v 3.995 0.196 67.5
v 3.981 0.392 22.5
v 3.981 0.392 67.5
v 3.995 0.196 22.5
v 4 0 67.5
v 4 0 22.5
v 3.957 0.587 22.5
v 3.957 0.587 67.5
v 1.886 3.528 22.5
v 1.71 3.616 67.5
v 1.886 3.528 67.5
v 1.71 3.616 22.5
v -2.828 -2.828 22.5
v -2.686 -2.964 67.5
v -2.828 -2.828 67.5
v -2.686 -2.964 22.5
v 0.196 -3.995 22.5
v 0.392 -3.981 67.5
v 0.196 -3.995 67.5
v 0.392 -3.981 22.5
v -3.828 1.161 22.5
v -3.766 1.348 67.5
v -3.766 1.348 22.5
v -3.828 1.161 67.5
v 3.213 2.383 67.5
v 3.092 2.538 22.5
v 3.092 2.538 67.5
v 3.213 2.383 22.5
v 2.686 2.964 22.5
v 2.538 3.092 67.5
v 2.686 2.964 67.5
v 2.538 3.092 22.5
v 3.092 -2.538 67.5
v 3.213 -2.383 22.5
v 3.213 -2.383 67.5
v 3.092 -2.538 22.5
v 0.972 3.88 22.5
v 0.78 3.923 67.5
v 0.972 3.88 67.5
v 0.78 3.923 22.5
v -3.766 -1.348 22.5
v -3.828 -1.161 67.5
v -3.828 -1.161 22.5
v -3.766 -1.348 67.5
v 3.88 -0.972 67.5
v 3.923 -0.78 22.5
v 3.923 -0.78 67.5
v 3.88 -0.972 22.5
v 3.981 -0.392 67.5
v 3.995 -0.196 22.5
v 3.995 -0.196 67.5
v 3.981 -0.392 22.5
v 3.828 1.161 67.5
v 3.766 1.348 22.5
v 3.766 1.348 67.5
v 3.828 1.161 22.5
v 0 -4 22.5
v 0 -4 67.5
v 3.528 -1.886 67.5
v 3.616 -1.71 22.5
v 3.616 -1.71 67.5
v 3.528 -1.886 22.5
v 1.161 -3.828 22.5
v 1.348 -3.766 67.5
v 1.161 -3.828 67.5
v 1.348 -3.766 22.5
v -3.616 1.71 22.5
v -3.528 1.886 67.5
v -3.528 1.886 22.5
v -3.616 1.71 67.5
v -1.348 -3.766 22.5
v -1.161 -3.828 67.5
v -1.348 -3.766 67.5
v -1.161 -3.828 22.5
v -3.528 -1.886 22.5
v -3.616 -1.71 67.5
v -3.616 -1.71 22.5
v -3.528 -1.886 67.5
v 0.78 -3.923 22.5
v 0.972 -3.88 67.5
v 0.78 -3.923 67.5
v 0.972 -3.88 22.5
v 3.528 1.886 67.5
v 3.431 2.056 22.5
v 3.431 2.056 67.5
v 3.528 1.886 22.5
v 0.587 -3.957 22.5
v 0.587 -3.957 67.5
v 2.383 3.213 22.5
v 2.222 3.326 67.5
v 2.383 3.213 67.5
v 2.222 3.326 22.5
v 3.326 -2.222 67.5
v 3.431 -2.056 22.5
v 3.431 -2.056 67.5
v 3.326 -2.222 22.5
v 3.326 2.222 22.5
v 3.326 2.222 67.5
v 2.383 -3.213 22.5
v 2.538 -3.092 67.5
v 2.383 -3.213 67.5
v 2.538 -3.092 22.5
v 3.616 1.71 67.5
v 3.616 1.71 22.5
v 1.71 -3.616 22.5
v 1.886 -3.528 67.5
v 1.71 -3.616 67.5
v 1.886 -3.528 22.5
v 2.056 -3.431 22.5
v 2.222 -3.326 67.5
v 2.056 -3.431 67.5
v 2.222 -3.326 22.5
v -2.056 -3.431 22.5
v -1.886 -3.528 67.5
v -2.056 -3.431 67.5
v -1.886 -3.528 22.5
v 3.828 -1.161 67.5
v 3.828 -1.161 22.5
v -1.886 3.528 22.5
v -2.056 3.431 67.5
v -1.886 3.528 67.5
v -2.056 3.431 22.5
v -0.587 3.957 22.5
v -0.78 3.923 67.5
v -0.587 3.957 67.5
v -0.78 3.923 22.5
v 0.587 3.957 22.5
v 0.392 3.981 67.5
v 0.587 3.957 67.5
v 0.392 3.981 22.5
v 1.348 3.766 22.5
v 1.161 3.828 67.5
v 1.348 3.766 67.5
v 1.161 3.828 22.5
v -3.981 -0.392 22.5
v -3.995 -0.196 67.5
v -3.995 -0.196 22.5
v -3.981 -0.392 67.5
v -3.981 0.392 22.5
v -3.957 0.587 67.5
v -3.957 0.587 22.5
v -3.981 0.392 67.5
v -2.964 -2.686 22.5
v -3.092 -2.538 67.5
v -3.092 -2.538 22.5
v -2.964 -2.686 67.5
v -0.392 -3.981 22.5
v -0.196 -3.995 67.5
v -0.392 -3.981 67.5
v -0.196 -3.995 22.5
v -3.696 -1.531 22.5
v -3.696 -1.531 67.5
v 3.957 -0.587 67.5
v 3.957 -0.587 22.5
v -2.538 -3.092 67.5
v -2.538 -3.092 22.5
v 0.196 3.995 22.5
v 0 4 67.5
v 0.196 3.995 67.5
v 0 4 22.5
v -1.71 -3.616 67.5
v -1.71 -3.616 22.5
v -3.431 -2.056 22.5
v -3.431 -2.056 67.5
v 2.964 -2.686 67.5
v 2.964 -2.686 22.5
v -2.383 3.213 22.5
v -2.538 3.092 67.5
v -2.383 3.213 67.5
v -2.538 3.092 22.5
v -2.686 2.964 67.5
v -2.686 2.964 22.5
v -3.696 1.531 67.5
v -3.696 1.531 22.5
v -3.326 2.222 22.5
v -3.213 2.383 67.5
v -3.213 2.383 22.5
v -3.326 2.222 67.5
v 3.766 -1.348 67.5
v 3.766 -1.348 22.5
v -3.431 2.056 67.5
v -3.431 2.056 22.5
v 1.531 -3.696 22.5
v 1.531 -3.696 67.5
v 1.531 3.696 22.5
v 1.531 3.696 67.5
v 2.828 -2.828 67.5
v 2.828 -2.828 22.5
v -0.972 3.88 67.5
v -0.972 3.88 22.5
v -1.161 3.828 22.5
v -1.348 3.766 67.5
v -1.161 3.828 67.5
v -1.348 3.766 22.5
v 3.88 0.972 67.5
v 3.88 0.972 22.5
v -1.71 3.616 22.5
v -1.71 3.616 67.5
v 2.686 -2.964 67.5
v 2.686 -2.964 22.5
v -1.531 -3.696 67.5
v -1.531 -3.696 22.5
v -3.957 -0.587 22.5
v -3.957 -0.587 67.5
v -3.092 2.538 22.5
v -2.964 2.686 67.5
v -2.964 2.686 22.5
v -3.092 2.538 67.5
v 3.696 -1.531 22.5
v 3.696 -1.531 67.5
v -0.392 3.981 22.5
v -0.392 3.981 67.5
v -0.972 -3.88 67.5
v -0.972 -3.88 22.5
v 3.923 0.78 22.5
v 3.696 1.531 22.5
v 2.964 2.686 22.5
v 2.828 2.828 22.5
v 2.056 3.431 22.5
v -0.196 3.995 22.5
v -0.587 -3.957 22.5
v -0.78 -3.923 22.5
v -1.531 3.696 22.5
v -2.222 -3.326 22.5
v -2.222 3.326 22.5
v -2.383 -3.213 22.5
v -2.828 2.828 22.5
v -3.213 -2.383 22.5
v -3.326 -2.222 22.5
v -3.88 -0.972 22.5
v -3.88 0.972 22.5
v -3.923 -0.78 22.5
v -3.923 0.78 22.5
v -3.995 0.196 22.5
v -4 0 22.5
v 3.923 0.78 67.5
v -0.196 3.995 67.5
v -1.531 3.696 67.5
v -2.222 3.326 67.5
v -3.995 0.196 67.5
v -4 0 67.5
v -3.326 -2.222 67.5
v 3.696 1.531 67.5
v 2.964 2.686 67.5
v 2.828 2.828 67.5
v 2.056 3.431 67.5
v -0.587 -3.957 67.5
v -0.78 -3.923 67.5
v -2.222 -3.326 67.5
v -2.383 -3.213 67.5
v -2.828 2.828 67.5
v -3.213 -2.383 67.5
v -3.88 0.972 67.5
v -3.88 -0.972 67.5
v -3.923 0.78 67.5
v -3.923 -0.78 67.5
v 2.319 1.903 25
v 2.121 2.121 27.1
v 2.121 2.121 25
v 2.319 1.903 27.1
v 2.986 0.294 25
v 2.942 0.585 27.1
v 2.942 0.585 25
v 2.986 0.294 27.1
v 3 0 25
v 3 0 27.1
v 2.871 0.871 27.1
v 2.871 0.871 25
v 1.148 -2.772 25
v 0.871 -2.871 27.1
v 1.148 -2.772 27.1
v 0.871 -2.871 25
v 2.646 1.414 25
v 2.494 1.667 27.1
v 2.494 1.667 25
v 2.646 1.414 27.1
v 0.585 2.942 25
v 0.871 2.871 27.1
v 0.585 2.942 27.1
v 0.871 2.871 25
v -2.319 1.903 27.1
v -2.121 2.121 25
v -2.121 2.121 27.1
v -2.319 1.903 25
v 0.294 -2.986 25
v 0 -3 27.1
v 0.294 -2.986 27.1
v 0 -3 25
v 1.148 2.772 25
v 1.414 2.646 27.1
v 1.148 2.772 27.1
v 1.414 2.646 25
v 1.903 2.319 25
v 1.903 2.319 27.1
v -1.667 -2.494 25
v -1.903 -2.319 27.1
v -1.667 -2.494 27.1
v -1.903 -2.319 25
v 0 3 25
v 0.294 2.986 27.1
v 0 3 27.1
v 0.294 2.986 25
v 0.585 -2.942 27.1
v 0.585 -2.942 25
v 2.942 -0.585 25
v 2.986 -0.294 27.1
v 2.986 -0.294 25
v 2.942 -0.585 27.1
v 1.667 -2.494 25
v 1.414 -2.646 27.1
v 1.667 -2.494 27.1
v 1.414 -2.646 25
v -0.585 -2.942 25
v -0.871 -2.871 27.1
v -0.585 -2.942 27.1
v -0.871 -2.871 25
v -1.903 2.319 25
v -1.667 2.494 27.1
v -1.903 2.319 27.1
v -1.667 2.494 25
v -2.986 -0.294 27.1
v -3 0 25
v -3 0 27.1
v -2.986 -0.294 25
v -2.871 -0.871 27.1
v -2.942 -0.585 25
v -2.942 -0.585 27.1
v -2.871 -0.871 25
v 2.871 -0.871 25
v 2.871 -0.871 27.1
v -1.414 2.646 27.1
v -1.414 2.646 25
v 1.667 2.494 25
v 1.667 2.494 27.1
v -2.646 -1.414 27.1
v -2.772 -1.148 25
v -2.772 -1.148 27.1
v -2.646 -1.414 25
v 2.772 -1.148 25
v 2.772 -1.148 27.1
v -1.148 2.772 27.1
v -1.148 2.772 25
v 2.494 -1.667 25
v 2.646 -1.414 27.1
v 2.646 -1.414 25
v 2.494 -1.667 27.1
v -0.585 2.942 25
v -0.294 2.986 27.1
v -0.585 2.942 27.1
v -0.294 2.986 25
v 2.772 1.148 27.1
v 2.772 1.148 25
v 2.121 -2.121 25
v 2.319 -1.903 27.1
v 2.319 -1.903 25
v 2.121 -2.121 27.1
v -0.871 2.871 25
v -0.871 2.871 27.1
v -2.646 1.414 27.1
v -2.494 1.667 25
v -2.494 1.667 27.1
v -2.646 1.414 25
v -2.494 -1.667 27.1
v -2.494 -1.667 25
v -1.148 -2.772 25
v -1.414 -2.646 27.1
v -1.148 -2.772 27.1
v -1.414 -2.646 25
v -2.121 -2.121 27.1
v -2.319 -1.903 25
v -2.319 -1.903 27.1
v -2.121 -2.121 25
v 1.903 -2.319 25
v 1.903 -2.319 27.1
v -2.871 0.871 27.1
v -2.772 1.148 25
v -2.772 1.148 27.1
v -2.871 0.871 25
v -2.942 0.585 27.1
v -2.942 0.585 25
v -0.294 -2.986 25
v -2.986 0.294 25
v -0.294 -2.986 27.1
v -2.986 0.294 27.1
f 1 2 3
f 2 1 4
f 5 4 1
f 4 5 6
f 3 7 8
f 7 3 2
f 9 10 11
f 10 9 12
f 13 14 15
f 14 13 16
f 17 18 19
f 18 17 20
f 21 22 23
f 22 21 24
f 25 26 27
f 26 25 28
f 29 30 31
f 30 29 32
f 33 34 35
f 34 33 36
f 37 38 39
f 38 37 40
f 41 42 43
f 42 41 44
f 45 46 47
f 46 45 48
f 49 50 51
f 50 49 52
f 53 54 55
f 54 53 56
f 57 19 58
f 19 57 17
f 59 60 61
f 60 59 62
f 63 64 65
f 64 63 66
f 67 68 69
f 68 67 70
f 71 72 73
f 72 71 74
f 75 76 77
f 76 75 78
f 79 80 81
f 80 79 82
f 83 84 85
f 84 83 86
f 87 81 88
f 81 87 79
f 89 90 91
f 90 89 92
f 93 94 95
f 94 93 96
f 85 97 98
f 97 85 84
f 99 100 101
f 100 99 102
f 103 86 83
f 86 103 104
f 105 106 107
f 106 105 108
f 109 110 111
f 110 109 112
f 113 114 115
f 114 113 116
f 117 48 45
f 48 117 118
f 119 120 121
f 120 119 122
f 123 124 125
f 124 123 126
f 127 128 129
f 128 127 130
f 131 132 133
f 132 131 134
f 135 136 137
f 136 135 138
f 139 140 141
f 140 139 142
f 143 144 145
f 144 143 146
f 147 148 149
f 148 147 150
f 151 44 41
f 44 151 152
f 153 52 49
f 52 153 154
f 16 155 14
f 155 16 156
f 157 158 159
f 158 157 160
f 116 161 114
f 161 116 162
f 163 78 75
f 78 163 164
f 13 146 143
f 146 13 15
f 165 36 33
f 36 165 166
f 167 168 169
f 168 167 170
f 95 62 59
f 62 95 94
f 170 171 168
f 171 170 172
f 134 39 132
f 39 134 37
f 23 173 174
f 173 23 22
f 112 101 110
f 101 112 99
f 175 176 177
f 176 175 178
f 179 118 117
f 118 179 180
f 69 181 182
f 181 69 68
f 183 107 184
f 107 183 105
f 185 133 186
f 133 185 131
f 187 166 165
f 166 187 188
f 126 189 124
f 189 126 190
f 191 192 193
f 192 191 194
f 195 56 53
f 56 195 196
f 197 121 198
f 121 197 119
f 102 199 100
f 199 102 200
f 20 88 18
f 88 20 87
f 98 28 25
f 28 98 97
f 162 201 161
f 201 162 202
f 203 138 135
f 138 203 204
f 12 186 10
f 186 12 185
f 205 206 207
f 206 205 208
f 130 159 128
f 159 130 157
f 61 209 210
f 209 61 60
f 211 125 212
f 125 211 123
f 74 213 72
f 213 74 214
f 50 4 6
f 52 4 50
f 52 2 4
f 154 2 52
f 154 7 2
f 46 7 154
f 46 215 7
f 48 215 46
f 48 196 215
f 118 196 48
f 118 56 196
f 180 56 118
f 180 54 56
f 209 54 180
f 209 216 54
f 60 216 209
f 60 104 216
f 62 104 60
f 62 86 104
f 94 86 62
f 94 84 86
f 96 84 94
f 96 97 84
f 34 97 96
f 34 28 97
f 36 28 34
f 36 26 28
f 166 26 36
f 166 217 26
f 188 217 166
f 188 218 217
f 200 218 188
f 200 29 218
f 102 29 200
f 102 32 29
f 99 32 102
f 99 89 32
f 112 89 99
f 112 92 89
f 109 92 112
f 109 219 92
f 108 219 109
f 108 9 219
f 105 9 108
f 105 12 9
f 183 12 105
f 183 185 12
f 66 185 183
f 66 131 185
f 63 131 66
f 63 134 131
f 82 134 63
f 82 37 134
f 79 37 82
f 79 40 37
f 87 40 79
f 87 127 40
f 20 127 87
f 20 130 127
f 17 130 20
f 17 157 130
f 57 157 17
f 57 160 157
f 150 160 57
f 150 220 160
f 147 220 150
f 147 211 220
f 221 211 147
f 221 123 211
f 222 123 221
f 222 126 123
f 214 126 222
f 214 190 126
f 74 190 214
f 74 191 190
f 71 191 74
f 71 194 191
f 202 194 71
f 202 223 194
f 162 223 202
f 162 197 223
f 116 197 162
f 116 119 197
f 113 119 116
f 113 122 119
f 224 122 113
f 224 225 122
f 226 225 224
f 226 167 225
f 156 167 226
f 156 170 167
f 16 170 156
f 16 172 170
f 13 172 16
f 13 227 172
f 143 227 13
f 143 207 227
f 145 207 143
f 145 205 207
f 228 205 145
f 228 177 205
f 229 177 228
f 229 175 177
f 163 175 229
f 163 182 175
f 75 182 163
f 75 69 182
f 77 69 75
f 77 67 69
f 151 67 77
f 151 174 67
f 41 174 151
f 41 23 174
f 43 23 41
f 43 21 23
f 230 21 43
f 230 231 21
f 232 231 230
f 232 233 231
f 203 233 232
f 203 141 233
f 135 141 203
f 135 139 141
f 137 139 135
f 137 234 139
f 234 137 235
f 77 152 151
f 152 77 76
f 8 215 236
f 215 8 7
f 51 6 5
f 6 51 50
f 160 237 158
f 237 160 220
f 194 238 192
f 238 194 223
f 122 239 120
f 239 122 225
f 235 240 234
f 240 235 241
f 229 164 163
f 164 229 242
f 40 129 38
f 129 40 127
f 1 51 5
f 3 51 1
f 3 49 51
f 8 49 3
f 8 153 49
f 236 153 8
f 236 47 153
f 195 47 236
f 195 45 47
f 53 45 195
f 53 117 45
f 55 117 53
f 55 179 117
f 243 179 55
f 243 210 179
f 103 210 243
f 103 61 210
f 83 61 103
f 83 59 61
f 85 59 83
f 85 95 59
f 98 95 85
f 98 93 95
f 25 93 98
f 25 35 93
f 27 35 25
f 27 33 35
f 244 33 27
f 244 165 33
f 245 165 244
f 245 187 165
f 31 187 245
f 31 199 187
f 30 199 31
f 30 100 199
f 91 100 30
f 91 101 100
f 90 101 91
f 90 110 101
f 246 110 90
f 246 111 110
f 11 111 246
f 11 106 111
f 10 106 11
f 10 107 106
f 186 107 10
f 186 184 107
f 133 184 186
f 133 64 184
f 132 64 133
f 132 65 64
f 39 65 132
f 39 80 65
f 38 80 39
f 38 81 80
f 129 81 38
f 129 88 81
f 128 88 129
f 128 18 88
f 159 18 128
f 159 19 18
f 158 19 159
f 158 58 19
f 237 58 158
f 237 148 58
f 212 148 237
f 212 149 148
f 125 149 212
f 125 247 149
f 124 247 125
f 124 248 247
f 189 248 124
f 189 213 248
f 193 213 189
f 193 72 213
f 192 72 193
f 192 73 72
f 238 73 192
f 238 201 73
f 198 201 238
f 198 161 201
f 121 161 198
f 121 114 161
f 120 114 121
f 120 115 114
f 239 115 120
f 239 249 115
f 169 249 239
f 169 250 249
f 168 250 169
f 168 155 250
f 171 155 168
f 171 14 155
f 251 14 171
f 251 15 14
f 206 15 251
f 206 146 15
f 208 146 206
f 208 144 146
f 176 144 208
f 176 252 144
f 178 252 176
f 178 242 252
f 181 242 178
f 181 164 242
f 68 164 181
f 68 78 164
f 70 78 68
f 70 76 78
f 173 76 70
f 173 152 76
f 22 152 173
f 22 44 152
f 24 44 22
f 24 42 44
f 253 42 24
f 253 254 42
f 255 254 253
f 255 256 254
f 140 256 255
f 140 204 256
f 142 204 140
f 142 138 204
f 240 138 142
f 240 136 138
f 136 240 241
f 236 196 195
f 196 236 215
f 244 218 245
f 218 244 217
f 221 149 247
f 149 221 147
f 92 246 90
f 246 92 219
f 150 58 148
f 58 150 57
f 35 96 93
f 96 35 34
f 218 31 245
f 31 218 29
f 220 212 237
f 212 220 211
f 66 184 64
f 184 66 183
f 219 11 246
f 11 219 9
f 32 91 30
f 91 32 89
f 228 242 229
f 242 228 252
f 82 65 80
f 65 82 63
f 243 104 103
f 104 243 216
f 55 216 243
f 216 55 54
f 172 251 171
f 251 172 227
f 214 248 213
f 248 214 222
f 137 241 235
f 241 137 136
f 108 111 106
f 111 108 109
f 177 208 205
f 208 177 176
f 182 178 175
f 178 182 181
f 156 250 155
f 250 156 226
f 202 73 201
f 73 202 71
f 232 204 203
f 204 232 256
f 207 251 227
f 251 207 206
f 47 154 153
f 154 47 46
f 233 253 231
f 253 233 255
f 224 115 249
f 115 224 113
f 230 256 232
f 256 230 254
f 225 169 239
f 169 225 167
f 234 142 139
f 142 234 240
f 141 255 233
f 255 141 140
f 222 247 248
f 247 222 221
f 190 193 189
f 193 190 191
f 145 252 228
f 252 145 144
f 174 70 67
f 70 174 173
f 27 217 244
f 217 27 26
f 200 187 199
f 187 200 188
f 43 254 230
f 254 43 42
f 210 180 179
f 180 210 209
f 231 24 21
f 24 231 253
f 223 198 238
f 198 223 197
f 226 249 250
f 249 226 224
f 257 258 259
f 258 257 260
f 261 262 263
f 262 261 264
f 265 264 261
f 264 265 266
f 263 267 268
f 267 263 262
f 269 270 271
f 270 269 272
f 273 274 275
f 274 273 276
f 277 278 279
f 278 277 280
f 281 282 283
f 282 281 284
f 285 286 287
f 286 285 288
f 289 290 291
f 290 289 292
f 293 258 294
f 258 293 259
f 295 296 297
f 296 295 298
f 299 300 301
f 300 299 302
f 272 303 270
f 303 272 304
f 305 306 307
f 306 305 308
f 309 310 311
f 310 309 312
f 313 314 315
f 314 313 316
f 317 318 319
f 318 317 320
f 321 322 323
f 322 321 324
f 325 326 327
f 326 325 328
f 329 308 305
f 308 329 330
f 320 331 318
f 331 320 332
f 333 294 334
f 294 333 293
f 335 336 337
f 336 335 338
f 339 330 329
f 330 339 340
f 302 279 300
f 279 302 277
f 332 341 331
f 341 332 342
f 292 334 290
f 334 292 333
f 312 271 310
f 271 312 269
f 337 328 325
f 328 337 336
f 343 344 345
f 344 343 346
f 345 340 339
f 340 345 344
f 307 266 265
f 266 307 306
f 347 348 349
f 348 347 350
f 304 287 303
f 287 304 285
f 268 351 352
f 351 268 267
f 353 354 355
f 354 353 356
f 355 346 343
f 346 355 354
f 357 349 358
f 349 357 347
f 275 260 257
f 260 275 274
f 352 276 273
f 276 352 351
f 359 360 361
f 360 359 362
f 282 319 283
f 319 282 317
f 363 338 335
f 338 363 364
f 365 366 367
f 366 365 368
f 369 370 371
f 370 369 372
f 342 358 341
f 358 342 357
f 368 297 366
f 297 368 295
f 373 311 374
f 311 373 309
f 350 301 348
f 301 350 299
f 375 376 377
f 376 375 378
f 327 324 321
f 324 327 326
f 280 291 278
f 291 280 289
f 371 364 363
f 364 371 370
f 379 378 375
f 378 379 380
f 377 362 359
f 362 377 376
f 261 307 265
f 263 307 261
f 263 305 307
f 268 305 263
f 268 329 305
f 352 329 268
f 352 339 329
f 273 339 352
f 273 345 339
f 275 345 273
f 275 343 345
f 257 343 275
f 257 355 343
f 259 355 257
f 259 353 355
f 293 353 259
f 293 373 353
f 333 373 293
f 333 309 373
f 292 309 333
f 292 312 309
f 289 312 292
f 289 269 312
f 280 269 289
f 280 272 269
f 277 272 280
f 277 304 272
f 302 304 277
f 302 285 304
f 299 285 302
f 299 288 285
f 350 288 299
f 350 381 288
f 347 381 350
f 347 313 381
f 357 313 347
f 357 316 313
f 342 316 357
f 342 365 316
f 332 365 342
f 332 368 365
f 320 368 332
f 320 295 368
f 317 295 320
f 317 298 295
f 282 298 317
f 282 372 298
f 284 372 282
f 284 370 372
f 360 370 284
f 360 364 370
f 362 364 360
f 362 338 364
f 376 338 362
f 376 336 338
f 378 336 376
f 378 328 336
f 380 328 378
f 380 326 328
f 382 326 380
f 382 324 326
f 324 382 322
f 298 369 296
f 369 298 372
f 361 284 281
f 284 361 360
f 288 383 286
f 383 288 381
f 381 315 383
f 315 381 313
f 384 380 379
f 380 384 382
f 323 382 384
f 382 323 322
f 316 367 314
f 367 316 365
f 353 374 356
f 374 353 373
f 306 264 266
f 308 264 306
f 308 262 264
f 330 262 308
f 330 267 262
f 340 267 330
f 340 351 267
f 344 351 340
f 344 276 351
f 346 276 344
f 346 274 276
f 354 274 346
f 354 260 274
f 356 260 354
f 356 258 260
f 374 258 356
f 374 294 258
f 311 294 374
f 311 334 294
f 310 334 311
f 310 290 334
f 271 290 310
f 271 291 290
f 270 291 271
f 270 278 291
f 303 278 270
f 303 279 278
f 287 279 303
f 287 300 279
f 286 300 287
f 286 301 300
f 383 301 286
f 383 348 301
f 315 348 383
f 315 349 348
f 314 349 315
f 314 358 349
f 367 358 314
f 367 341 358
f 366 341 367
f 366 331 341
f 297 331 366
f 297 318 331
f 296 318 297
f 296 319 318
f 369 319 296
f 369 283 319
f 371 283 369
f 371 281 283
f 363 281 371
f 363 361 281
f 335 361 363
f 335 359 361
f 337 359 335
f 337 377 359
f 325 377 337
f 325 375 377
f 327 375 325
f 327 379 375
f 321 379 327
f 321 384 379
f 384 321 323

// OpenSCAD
$fn = 128; // High resolution for smooth curves and accurate hole sizes

// --- Dimensions ---
// Handle
d_handle = 8;      // Diameter of handle (mm)
h_handle = 45;     // Height of handle (mm)

// Cone
d_cone_top = 8;    // Top diameter of cone (matches handle) (mm)
d_cone_bot = 3;    // Bottom diameter of cone (mm)
h_cone = 17;       // Height of cone (62 - 45) (mm)

// Tip
d_tip = 3;         // Diameter of spherical tip (mm)
z_tip_center = 62; // Z-coordinate of sphere center (mm)

// Grooves
n_grooves = 4;     // Number of circumferential grooves
w_groove = 2;      // Width of groove in Z (mm)
d_groove = 1;      // Depth of groove (mm)
z_grooves = [10, 15, 20, 25]; // Z-centers of the 4 grooves

// --- Construction ---

// Main body: Handle + Cone + Tip
// We build this as a single union, then subtract grooves.

module pestle_body() {
    // 1. Handle Cylinder
    // Centered at z = h_handle/2 = 22.5
    translate([0, 0, h_handle / 2]) {
        cylinder(h = h_handle, r = d_handle / 2);
    }
    
    // 2. Cone
    // Tapers from d_cone_top at z = h_handle to d_cone_bot at z = h_handle + h_cone
    // Center of cone is at z = h_handle + h_cone/2
    translate([0, 0, h_handle + h_cone / 2]) {
        // Create cone using rotate_extrude
        // Profile in XY plane: X=radius, Y=height
        // We want the cone to go from z=0 (relative to cone center) to z=h_cone
        // Top (z=-h_cone/2): radius = d_cone_top/2
        // Bottom (z=h_cone/2): radius = d_cone_bot/2
        
        rotate_extrude($fn = 64) {
            // Path: (radius, z)
            // Start: (d_cone_top/2, -h_cone/2)
            // End:   (d_cone_bot/2, h_cone/2)
            // Close loop back to start to define the area
            polygon = [
                [d_cone_top / 2, -h_cone / 2],
                [d_cone_bot / 2, h_cone / 2],
                [d_cone_bot / 2, -h_cone / 2],
                [d_cone_top / 2, -h_cone / 2]
            ];
        }
    }
    
    // 3. Spherical Tip
    // Centered at z = h_handle + h_cone = 62
    translate([0, 0, h_handle + h_cone]) {
        sphere(r = d_tip / 2);
    }
}

// --- Grooves ---
// Cut 4 circumferential grooves into the handle
// Handle is from z=0 to z=45.
// Grooves are 2mm wide (Z), 1mm deep.
// Centers at z=10, 15, 20, 25.

module grooves() {
    // We need to cut holes into the cylinder.
    // The cylinder is centered at z=22.5.
    // Groove centers: 10, 15, 20, 25.
    // Width 2mm means from z_center-1 to z_center+1.
    // Depth 1mm means from z_surface_inwards by 1mm.
    // Surface of handle is at r = 4mm.
    // So we cut a cylinder of r = 4 - 1 = 3mm, height = 2mm.
    
    for (z = z_grooves) {
        // Position the cutter
        // The handle is centered at z=22.5.
        // The groove is centered at z.
        // The cutter needs to be centered at z.
        translate([0, 0, z]) {
            // Cutter: Cylinder
            // Radius: (d_handle/2) - d_groove = 4 - 1 = 3mm
            // Height: w_groove = 2mm
            // We extend slightly past the faces to ensure clean cut (Rule 5)
            // The handle is 45mm tall. The grooves are well within.
            // We add 0.1mm to height to ensure no coplanar faces.
            cylinder(
                h = w_groove + 0.1, 
                r = (d_handle / 2) - d_groove,
                $fn = 64
            );
        }
    }
}

// --- Final Assembly ---

// Build the main body
difference() {
    union() {
        pestle_body();
    }
    
    // Cut the grooves
    grooves();
}
